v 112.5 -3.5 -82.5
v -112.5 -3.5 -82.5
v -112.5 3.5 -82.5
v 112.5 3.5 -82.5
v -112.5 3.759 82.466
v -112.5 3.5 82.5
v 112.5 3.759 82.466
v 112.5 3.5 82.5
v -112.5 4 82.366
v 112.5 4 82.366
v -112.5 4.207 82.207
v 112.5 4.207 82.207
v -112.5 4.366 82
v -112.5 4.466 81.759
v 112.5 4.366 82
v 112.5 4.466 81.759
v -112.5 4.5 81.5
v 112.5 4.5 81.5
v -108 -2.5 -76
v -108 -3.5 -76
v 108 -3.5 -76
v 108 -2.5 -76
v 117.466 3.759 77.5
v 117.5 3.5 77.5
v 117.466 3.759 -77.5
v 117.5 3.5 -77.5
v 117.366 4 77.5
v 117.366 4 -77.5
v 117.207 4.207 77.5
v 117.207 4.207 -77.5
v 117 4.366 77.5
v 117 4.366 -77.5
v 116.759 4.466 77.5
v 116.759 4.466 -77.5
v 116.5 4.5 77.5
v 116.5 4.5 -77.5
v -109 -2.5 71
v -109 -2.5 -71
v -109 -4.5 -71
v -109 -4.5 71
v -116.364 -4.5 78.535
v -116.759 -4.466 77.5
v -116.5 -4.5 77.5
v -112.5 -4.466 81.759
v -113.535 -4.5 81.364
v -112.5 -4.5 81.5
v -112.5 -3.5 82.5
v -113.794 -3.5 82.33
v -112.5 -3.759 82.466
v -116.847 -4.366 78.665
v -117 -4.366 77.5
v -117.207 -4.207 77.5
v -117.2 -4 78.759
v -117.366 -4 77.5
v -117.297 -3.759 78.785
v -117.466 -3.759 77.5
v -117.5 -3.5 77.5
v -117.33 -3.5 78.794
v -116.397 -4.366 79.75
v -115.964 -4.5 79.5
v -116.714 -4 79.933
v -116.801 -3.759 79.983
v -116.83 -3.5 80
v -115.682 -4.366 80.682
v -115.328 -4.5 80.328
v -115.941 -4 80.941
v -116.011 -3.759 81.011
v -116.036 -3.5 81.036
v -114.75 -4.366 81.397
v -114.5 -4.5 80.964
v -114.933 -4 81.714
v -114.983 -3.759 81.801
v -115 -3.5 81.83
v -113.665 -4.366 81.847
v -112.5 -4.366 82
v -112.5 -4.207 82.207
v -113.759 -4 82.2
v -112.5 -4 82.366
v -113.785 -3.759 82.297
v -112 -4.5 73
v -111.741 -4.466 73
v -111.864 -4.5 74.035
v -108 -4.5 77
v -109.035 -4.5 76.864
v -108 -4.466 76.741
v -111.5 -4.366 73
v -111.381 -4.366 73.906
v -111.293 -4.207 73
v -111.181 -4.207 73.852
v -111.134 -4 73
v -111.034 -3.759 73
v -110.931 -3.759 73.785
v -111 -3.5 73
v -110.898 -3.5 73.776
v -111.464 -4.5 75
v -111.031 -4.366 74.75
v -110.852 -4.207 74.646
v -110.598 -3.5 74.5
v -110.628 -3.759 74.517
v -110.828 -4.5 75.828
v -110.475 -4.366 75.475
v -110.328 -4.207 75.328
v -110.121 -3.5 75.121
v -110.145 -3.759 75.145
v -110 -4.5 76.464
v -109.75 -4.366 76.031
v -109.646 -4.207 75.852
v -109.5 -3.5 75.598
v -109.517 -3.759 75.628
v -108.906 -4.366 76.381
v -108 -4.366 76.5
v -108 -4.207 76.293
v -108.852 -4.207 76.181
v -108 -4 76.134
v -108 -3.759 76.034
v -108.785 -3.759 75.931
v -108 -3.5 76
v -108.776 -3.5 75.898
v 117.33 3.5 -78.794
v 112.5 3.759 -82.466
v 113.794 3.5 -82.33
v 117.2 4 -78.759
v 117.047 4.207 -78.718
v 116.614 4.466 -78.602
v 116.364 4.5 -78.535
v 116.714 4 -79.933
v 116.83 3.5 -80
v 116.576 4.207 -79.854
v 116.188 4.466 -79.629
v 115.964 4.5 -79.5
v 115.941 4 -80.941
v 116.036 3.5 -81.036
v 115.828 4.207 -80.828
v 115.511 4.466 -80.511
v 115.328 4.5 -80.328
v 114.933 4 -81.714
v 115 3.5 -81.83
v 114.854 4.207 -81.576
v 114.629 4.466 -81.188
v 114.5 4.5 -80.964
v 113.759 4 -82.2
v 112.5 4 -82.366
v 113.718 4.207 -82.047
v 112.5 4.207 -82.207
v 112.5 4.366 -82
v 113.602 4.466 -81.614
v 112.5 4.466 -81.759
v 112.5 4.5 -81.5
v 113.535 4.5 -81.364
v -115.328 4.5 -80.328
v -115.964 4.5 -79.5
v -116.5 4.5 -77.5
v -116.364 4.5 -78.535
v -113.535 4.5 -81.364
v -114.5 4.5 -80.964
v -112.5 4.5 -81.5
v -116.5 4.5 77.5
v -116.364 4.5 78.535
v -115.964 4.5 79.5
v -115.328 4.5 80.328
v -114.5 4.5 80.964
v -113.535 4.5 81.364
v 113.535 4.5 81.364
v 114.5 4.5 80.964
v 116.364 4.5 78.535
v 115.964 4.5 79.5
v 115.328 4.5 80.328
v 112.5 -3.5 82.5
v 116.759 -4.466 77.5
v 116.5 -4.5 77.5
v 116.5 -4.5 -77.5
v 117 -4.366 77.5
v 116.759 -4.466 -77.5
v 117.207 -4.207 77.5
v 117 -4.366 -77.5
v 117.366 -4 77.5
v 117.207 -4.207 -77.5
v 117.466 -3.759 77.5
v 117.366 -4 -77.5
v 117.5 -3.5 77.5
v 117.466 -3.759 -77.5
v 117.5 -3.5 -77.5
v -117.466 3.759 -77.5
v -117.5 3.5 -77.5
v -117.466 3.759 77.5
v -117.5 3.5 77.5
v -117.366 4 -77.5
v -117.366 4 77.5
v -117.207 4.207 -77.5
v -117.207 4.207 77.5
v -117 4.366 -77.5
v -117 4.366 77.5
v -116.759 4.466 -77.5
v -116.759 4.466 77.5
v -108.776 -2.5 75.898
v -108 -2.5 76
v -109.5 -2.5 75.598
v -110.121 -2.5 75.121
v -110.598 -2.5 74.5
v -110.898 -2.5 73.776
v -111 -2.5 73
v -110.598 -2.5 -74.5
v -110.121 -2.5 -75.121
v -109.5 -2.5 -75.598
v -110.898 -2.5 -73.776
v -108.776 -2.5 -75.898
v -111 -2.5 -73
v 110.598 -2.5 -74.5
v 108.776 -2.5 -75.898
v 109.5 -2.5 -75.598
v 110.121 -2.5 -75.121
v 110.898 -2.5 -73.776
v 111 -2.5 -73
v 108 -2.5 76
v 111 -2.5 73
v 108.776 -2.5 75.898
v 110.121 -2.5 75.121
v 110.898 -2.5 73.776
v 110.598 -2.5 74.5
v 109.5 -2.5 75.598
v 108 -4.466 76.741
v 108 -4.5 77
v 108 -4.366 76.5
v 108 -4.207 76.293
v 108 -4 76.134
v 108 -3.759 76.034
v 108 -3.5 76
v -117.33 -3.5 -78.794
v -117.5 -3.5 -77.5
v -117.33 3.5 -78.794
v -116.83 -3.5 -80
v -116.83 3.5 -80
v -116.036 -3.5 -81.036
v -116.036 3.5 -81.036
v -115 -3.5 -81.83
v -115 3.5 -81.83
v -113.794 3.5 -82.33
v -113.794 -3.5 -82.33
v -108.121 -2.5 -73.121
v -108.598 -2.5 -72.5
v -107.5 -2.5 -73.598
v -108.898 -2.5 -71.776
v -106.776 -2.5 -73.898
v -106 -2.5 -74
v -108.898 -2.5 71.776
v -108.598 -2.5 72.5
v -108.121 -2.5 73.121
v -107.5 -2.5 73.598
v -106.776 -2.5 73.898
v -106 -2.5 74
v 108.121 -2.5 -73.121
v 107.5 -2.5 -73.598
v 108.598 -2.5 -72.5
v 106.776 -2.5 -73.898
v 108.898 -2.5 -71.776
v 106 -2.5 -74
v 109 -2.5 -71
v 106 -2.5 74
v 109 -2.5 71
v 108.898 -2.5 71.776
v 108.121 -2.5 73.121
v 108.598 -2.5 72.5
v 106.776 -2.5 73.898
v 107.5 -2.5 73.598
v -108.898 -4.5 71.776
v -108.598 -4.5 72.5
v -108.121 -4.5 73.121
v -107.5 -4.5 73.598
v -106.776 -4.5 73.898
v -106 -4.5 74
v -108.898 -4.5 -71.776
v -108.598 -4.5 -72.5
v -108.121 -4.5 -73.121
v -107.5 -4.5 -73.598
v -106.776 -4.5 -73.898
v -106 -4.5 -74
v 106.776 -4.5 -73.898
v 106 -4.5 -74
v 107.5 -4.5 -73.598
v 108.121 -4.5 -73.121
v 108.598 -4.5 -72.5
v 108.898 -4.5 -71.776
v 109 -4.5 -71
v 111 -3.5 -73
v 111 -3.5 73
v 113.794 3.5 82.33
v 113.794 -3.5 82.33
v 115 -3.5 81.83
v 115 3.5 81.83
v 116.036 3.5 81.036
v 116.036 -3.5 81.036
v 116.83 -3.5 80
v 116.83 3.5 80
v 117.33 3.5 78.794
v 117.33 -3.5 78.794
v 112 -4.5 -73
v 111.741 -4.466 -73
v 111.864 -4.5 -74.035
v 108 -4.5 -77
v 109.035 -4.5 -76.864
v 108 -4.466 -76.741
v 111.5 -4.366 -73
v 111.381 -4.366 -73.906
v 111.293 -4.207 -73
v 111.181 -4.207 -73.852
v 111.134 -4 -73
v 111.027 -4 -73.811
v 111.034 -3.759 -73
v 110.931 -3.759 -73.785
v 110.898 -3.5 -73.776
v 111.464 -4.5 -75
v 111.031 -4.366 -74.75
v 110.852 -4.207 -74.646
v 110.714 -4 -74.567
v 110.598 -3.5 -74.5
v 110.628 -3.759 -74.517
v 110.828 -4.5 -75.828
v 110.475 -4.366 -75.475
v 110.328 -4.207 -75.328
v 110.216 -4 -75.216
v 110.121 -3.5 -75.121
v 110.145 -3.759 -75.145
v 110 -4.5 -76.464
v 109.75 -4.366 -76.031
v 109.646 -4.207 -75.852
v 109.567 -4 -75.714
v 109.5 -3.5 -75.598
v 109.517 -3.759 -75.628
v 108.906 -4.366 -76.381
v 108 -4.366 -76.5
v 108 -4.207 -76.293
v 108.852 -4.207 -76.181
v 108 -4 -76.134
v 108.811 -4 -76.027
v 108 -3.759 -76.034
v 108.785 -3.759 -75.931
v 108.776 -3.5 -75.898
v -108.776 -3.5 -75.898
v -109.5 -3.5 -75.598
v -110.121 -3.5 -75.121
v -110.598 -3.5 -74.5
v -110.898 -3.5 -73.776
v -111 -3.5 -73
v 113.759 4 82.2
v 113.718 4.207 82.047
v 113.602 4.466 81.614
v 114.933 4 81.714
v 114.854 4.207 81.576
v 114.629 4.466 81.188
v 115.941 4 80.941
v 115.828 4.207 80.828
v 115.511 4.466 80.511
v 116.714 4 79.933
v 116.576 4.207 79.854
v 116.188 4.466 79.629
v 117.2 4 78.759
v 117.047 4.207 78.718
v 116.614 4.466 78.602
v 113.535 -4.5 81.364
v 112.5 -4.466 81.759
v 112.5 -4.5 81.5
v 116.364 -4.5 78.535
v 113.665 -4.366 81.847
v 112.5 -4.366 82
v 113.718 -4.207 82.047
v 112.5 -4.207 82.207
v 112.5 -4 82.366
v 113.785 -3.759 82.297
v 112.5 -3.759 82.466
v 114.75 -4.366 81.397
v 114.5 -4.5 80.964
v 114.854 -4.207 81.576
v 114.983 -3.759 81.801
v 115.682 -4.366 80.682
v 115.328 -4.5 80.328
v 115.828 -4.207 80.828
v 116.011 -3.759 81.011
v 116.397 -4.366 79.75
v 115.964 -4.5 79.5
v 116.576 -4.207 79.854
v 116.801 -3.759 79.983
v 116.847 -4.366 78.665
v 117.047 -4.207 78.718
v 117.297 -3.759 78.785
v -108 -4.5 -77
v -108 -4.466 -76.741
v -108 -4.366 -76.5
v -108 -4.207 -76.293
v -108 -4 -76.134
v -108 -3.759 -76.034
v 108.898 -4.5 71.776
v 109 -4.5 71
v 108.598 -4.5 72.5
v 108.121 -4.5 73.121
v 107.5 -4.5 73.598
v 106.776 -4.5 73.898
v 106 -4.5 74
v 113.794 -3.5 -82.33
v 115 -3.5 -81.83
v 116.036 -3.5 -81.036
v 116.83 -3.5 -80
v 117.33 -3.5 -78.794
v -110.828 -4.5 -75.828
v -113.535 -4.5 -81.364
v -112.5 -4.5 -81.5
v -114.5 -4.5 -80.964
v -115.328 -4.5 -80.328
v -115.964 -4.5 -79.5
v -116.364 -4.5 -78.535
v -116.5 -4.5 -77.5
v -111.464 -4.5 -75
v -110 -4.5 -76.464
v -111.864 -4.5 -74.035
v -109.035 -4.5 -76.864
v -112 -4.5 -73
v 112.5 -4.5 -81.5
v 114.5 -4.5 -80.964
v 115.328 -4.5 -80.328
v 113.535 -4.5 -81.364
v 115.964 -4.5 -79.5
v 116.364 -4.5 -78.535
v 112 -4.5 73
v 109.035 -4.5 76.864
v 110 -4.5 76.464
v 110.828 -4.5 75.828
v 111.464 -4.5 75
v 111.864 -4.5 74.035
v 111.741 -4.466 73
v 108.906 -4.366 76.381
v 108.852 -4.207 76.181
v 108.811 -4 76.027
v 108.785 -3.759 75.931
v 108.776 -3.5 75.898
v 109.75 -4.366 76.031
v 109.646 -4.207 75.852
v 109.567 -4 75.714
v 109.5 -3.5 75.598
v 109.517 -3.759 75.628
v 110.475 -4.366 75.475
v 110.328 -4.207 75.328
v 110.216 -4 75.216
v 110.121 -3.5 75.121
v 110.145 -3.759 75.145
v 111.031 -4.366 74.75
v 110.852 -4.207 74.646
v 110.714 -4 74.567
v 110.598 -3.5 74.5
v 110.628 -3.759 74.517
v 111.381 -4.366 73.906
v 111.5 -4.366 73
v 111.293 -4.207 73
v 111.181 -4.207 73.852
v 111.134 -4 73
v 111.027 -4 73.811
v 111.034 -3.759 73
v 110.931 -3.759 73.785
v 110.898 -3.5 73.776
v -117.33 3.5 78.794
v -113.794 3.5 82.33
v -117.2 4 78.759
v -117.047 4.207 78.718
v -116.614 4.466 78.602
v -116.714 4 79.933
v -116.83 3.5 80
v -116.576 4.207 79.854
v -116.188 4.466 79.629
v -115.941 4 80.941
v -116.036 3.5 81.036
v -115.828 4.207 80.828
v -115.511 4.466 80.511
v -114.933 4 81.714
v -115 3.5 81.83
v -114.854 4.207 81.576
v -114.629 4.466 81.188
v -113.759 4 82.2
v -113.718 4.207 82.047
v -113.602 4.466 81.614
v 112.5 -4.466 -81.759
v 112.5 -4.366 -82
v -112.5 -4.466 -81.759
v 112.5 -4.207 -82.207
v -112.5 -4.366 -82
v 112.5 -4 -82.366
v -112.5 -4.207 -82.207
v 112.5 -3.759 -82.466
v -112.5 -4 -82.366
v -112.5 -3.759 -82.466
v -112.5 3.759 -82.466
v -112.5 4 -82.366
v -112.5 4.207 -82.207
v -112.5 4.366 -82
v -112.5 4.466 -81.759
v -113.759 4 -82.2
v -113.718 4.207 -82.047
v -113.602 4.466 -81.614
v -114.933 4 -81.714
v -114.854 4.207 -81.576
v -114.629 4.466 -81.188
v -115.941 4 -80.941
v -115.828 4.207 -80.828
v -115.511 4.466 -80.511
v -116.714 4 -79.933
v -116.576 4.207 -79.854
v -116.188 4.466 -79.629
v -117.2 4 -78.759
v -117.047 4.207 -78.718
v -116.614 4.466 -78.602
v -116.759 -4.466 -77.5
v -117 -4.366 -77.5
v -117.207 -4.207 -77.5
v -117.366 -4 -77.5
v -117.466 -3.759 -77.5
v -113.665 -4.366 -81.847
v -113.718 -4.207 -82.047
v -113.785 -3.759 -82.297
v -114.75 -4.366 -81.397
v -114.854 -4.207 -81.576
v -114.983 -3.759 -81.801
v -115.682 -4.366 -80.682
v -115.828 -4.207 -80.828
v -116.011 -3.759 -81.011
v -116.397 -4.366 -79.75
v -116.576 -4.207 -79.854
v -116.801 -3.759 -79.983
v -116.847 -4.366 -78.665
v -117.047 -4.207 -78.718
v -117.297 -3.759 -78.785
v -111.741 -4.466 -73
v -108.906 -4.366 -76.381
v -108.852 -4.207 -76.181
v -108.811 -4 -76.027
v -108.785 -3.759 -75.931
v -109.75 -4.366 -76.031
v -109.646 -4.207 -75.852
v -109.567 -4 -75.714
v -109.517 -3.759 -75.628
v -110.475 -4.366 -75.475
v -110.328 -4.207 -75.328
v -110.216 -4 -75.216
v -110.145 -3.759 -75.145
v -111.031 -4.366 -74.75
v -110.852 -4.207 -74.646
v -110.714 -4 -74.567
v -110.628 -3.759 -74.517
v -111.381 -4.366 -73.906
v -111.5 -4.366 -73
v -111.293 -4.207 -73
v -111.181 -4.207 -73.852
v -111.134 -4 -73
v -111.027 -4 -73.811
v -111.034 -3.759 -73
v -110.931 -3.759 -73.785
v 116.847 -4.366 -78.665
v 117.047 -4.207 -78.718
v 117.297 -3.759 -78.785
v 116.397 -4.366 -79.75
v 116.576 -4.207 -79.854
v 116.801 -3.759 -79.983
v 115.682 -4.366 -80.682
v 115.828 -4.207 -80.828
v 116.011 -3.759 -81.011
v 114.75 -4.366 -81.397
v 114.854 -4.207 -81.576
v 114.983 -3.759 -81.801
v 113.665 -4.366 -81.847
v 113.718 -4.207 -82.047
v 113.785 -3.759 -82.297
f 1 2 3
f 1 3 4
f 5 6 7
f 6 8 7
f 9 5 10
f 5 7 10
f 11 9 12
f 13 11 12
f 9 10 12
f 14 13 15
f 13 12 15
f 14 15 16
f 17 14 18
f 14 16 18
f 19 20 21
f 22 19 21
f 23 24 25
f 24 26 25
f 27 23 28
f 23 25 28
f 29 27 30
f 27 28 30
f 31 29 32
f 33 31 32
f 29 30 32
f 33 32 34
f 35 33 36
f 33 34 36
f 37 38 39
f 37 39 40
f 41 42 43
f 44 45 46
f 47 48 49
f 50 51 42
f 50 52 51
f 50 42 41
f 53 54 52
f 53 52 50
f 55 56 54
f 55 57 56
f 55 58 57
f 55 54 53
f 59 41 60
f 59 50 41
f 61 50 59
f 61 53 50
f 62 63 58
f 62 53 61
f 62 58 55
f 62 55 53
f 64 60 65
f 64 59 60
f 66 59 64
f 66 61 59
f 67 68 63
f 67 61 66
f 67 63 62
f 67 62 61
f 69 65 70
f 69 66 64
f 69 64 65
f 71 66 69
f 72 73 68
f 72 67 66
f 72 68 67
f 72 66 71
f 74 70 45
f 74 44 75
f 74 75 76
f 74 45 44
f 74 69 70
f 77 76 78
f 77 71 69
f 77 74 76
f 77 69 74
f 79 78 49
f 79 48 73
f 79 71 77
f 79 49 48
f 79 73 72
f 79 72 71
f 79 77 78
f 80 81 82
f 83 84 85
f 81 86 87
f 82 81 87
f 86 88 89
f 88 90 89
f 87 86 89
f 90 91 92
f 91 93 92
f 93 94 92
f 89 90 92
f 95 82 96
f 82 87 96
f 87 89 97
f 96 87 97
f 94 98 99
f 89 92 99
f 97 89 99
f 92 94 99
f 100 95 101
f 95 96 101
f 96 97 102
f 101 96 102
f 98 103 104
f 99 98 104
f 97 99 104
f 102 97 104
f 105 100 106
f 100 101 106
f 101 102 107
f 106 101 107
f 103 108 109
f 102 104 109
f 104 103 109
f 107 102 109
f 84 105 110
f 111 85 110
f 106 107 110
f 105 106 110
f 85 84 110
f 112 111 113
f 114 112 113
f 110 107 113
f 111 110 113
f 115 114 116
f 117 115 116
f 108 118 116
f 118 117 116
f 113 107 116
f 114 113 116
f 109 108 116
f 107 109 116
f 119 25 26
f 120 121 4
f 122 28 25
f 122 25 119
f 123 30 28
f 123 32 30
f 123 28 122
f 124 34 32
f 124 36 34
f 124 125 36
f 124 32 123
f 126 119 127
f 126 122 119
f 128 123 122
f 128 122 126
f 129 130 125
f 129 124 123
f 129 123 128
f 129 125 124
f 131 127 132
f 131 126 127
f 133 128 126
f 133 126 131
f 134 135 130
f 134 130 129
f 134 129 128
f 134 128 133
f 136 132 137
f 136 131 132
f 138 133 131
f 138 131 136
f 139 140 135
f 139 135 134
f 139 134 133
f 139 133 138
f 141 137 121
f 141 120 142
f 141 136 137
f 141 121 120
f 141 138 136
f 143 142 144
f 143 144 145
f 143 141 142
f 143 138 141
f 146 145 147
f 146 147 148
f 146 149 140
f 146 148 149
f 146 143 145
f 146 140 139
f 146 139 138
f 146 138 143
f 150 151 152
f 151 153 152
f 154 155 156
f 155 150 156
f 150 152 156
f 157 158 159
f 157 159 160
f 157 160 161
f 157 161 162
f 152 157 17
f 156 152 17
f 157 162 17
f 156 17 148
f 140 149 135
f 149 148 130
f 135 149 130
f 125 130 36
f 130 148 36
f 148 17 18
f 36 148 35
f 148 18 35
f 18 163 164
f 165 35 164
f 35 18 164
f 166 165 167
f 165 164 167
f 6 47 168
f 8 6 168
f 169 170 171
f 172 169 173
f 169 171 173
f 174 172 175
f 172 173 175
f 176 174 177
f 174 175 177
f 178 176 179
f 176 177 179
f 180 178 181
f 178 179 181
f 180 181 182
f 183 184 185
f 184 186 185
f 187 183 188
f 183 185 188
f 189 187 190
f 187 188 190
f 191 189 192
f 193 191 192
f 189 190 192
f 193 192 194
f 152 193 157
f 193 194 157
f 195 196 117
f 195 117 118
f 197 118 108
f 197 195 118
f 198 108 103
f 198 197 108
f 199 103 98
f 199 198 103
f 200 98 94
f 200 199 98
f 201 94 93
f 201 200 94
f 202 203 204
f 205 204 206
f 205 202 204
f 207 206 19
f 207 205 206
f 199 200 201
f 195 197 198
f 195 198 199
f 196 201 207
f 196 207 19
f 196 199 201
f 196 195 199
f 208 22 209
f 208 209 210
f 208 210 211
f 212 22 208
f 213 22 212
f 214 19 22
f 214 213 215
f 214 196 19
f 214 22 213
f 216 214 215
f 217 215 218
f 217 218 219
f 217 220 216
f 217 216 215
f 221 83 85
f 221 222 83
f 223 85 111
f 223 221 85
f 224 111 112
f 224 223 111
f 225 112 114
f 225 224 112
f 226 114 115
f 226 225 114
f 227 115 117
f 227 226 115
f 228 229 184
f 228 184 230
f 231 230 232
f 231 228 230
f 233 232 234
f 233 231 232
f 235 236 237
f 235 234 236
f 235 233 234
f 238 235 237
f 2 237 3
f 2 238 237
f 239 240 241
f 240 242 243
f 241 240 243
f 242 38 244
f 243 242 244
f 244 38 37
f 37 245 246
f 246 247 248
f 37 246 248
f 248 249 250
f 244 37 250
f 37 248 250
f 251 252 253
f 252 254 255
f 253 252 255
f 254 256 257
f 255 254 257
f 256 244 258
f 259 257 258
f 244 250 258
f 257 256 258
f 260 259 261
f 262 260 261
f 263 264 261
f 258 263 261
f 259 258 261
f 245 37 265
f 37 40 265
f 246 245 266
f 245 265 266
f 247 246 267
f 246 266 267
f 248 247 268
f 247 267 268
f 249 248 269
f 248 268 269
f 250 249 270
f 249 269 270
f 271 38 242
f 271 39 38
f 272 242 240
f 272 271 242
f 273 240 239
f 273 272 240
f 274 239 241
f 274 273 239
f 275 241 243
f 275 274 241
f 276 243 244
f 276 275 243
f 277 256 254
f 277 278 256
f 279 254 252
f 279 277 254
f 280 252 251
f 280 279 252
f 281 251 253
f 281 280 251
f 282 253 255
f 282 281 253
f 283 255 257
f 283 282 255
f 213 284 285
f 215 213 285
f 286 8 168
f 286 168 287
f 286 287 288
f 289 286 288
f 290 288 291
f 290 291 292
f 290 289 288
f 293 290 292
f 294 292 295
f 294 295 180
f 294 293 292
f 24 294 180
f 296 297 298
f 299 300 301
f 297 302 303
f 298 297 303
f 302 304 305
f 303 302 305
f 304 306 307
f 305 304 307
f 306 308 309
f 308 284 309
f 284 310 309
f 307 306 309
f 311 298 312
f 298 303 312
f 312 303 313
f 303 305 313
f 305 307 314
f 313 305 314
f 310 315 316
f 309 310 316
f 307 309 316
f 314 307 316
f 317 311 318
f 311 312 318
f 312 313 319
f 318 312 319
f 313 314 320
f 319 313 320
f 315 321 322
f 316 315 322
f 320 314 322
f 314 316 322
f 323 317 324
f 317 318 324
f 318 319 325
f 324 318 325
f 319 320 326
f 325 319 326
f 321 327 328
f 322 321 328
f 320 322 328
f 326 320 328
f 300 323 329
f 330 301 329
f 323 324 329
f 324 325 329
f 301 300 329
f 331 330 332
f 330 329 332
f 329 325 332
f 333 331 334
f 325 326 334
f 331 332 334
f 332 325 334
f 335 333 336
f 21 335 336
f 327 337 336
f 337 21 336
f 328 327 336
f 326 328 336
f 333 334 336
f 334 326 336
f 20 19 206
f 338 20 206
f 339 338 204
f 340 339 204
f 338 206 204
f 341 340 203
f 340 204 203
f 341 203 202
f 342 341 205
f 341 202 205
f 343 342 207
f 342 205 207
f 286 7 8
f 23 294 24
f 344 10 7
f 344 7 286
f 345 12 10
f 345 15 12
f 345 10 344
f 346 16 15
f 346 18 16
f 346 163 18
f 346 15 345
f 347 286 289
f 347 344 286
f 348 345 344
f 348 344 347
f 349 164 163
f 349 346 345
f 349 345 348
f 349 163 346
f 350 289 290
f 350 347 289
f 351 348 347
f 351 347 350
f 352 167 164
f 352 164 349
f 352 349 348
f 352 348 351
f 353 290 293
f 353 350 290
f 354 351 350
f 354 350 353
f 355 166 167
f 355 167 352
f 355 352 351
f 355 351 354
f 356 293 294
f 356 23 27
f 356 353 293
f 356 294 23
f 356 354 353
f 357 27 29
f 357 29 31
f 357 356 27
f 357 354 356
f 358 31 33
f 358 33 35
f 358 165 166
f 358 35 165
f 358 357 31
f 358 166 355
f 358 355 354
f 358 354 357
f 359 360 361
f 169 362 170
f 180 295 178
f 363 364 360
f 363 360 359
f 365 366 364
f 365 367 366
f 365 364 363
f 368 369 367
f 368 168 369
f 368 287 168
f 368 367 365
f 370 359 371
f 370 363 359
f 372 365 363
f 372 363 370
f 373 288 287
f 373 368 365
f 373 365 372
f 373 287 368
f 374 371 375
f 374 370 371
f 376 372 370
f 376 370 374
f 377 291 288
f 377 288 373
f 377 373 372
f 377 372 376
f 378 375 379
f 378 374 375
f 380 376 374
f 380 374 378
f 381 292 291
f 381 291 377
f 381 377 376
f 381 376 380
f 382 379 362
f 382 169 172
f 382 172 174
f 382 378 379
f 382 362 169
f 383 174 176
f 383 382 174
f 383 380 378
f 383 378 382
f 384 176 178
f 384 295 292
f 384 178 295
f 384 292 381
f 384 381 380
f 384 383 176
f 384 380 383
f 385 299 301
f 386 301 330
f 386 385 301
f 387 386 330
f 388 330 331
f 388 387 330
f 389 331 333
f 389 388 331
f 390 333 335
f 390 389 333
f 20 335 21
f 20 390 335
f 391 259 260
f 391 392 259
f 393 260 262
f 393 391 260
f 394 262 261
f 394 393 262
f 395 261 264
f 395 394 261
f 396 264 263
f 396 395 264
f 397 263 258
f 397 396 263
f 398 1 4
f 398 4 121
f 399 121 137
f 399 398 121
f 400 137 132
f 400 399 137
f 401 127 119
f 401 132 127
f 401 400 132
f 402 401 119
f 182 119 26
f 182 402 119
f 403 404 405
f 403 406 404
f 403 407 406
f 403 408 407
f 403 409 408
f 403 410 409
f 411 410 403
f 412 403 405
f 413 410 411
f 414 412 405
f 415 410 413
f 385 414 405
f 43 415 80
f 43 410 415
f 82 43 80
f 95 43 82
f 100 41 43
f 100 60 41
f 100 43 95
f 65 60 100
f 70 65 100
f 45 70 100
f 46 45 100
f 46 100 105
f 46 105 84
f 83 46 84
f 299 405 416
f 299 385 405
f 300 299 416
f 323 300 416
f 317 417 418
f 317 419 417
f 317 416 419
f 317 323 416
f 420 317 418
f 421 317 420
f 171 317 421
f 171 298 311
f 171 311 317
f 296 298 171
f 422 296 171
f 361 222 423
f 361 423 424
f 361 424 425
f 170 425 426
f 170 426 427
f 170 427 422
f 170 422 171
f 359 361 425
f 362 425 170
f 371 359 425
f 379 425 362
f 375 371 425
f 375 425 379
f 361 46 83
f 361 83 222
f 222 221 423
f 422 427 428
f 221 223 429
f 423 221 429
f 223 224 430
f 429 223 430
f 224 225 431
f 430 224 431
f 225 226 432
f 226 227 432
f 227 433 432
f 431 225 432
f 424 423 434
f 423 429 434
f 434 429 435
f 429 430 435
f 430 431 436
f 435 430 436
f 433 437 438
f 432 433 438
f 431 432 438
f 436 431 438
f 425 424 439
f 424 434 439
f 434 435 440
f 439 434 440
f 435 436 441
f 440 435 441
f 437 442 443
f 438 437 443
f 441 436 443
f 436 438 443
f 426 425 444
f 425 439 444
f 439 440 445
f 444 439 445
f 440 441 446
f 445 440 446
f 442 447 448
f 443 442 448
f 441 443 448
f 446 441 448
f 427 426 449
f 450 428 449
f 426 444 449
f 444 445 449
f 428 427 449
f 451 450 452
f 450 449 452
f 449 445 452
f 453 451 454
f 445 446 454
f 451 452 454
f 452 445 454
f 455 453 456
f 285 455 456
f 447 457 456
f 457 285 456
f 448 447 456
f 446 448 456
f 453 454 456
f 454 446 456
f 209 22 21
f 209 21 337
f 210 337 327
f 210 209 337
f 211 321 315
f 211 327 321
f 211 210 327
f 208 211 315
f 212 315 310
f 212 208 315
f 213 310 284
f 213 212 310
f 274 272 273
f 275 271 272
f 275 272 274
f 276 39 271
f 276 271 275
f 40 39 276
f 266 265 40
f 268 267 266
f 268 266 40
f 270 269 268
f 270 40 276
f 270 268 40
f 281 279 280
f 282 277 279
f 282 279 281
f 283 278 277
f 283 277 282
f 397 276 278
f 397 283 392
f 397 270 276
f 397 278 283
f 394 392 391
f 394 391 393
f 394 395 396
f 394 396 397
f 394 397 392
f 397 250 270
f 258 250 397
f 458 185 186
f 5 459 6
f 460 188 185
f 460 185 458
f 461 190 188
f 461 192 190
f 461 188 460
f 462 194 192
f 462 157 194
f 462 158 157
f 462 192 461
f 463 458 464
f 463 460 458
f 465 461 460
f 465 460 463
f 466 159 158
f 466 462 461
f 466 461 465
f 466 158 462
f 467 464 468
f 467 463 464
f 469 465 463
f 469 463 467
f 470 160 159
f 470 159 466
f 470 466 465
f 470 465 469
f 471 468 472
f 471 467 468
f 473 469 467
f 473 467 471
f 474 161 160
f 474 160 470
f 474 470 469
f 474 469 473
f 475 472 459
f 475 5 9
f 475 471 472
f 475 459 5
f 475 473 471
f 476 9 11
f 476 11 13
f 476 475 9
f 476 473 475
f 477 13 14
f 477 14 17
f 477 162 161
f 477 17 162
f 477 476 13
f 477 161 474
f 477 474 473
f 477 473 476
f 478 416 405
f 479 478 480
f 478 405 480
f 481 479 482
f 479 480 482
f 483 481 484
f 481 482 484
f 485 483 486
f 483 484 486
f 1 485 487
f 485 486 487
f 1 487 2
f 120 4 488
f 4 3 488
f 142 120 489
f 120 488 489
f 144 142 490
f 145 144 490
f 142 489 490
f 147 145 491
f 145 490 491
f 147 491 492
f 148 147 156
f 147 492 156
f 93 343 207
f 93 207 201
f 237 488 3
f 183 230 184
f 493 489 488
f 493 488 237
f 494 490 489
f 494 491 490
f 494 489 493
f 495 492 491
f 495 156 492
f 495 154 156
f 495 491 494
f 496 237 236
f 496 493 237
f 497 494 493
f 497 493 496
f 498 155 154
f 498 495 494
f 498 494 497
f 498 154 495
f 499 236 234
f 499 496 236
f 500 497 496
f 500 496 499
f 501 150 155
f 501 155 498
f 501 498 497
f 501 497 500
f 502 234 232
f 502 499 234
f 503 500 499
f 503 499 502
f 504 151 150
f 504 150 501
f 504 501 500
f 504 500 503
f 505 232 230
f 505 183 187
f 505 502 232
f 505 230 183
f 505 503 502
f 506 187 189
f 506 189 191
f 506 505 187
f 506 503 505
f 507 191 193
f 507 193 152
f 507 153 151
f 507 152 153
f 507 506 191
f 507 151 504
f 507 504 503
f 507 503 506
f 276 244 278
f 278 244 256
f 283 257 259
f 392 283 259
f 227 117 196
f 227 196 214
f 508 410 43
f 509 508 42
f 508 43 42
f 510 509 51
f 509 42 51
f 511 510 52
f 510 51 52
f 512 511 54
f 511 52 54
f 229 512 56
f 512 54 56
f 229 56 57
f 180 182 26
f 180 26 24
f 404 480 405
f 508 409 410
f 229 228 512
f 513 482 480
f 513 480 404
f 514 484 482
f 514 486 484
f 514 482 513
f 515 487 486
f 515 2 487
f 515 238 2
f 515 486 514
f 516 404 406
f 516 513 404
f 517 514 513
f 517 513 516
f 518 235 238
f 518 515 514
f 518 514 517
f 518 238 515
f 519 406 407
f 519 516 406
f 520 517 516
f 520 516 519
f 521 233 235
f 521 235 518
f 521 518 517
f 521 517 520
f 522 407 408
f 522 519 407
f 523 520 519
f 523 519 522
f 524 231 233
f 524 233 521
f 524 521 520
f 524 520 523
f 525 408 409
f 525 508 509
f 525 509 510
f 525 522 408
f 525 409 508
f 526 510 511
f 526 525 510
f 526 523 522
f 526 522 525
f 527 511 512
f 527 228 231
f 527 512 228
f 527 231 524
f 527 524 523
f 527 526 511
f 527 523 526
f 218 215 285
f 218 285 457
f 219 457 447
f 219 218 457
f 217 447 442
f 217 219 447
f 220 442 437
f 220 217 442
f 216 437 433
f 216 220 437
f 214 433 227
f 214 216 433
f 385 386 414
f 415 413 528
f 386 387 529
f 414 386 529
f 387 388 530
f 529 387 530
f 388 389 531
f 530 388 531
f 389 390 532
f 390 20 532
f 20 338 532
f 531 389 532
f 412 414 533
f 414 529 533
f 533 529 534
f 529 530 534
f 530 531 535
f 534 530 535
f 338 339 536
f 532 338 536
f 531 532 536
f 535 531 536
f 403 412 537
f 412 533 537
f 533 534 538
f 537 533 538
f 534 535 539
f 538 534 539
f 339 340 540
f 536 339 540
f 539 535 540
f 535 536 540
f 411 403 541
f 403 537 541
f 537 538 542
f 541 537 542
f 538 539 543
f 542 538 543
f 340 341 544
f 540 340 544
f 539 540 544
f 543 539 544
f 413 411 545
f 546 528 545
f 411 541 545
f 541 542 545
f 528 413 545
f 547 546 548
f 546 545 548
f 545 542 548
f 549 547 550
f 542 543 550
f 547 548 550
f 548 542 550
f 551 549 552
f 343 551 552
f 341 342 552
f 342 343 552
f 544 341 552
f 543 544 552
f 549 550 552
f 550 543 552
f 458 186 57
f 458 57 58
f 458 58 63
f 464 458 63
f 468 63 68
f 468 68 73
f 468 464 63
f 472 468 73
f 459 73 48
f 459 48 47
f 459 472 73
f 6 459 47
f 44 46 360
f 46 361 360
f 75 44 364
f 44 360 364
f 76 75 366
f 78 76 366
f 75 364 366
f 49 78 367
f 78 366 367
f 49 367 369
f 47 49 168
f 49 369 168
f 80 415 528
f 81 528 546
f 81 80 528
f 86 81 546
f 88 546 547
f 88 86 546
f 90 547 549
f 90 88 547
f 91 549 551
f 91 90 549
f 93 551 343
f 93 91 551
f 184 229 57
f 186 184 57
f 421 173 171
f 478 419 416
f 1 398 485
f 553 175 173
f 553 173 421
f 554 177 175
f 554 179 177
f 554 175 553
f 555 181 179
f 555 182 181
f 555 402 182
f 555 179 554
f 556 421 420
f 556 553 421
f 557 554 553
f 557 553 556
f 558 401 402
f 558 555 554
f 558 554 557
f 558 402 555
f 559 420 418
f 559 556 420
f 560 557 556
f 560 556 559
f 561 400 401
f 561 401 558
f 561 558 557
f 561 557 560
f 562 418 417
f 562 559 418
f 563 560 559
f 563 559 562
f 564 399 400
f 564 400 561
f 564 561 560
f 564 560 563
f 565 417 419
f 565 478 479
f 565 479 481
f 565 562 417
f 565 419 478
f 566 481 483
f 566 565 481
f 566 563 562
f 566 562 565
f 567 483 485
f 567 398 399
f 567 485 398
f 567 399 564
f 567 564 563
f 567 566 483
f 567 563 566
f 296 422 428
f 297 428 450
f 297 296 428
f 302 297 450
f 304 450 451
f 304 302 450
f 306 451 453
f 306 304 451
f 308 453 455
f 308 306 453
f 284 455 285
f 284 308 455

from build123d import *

# Parameters (mm, degrees)
SKETCH_W     = 235
SKETCH_H     = 165
PAD_DEPTH    = 4.5
SKETCH001_W  = 222
SKETCH001_H  = 152
POCKET_DEPTH = 2
FILLET_R     = 5
FILLET001_R  = 3
FILLET002_R  = 1
FILLET003_R  = 1
FILLET004_R  = 1
SKETCH002_W  = 218
SKETCH002_H  = 148
PAD001_DEPTH = 2
FILLET005_R  = 3


with BuildPart() as body:
    # Sketch → Pad (new body, symmetric)
    with BuildSketch(Plane.XZ):
        Rectangle(SKETCH_W, SKETCH_H)
    extrude(amount=PAD_DEPTH, both=True)

    # Sketch001 (on Face6 of Pad) → Pocket (cut)
    with BuildSketch(Plane.XZ.offset(4.5)):
        Rectangle(SKETCH001_W, SKETCH001_H)
    extrude(amount=-POCKET_DEPTH, mode=Mode.SUBTRACT)

    # Fillet
    fillet_edges = [body.edges().sort_by_distance(p)[0] for p in [
        (117.5, 0, 82.5),
        (-117.5, 0, 82.5),
        (-117.5, 0, -82.5),
        (117.5, 0, -82.5),
    ]]
    fillet(fillet_edges, radius=FILLET_R)

    # Fillet001
    fillet001_edges = [body.edges().sort_by_distance(p)[0] for p in [
        (111, -3.5, 76),
        (-111, -3.5, 76),
        (-111, -3.5, -76),
        (111, -3.5, -76),
    ]]
    fillet(fillet001_edges, radius=FILLET001_R)

    # Fillet002
    fillet002_edges = [body.edges().sort_by_distance(p)[0] for p in [
        (0, -4.5, 82.5),
    ]]
    fillet(fillet002_edges, radius=FILLET002_R)

    # Fillet003
    fillet003_edges = [body.edges().sort_by_distance(p)[0] for p in [
        (0, 4.5, 82.5),
    ]]
    fillet(fillet003_edges, radius=FILLET003_R)

    # Fillet004
    fillet004_edges = [body.edges().sort_by_distance(p)[0] for p in [
        (0, -4.5, 76),
    ]]
    fillet(fillet004_edges, radius=FILLET004_R)


with BuildPart() as body001:
    # Sketch002 → Pad001 (new body)
    with BuildSketch(Plane.XZ.offset(2.5)):
        Rectangle(SKETCH002_W, SKETCH002_H)
    extrude(amount=PAD001_DEPTH)

    # Fillet005
    fillet005_edges = [body001.edges().sort_by_distance(p)[0] for p in [
        (109, -3.5, 74),
        (109, -3.5, -74),
        (-109, -3.5, -74),
        (-109, -3.5, 74),
    ]]
    fillet(fillet005_edges, radius=FILLET005_R)


solid = Compound([body.part, body001.part])
